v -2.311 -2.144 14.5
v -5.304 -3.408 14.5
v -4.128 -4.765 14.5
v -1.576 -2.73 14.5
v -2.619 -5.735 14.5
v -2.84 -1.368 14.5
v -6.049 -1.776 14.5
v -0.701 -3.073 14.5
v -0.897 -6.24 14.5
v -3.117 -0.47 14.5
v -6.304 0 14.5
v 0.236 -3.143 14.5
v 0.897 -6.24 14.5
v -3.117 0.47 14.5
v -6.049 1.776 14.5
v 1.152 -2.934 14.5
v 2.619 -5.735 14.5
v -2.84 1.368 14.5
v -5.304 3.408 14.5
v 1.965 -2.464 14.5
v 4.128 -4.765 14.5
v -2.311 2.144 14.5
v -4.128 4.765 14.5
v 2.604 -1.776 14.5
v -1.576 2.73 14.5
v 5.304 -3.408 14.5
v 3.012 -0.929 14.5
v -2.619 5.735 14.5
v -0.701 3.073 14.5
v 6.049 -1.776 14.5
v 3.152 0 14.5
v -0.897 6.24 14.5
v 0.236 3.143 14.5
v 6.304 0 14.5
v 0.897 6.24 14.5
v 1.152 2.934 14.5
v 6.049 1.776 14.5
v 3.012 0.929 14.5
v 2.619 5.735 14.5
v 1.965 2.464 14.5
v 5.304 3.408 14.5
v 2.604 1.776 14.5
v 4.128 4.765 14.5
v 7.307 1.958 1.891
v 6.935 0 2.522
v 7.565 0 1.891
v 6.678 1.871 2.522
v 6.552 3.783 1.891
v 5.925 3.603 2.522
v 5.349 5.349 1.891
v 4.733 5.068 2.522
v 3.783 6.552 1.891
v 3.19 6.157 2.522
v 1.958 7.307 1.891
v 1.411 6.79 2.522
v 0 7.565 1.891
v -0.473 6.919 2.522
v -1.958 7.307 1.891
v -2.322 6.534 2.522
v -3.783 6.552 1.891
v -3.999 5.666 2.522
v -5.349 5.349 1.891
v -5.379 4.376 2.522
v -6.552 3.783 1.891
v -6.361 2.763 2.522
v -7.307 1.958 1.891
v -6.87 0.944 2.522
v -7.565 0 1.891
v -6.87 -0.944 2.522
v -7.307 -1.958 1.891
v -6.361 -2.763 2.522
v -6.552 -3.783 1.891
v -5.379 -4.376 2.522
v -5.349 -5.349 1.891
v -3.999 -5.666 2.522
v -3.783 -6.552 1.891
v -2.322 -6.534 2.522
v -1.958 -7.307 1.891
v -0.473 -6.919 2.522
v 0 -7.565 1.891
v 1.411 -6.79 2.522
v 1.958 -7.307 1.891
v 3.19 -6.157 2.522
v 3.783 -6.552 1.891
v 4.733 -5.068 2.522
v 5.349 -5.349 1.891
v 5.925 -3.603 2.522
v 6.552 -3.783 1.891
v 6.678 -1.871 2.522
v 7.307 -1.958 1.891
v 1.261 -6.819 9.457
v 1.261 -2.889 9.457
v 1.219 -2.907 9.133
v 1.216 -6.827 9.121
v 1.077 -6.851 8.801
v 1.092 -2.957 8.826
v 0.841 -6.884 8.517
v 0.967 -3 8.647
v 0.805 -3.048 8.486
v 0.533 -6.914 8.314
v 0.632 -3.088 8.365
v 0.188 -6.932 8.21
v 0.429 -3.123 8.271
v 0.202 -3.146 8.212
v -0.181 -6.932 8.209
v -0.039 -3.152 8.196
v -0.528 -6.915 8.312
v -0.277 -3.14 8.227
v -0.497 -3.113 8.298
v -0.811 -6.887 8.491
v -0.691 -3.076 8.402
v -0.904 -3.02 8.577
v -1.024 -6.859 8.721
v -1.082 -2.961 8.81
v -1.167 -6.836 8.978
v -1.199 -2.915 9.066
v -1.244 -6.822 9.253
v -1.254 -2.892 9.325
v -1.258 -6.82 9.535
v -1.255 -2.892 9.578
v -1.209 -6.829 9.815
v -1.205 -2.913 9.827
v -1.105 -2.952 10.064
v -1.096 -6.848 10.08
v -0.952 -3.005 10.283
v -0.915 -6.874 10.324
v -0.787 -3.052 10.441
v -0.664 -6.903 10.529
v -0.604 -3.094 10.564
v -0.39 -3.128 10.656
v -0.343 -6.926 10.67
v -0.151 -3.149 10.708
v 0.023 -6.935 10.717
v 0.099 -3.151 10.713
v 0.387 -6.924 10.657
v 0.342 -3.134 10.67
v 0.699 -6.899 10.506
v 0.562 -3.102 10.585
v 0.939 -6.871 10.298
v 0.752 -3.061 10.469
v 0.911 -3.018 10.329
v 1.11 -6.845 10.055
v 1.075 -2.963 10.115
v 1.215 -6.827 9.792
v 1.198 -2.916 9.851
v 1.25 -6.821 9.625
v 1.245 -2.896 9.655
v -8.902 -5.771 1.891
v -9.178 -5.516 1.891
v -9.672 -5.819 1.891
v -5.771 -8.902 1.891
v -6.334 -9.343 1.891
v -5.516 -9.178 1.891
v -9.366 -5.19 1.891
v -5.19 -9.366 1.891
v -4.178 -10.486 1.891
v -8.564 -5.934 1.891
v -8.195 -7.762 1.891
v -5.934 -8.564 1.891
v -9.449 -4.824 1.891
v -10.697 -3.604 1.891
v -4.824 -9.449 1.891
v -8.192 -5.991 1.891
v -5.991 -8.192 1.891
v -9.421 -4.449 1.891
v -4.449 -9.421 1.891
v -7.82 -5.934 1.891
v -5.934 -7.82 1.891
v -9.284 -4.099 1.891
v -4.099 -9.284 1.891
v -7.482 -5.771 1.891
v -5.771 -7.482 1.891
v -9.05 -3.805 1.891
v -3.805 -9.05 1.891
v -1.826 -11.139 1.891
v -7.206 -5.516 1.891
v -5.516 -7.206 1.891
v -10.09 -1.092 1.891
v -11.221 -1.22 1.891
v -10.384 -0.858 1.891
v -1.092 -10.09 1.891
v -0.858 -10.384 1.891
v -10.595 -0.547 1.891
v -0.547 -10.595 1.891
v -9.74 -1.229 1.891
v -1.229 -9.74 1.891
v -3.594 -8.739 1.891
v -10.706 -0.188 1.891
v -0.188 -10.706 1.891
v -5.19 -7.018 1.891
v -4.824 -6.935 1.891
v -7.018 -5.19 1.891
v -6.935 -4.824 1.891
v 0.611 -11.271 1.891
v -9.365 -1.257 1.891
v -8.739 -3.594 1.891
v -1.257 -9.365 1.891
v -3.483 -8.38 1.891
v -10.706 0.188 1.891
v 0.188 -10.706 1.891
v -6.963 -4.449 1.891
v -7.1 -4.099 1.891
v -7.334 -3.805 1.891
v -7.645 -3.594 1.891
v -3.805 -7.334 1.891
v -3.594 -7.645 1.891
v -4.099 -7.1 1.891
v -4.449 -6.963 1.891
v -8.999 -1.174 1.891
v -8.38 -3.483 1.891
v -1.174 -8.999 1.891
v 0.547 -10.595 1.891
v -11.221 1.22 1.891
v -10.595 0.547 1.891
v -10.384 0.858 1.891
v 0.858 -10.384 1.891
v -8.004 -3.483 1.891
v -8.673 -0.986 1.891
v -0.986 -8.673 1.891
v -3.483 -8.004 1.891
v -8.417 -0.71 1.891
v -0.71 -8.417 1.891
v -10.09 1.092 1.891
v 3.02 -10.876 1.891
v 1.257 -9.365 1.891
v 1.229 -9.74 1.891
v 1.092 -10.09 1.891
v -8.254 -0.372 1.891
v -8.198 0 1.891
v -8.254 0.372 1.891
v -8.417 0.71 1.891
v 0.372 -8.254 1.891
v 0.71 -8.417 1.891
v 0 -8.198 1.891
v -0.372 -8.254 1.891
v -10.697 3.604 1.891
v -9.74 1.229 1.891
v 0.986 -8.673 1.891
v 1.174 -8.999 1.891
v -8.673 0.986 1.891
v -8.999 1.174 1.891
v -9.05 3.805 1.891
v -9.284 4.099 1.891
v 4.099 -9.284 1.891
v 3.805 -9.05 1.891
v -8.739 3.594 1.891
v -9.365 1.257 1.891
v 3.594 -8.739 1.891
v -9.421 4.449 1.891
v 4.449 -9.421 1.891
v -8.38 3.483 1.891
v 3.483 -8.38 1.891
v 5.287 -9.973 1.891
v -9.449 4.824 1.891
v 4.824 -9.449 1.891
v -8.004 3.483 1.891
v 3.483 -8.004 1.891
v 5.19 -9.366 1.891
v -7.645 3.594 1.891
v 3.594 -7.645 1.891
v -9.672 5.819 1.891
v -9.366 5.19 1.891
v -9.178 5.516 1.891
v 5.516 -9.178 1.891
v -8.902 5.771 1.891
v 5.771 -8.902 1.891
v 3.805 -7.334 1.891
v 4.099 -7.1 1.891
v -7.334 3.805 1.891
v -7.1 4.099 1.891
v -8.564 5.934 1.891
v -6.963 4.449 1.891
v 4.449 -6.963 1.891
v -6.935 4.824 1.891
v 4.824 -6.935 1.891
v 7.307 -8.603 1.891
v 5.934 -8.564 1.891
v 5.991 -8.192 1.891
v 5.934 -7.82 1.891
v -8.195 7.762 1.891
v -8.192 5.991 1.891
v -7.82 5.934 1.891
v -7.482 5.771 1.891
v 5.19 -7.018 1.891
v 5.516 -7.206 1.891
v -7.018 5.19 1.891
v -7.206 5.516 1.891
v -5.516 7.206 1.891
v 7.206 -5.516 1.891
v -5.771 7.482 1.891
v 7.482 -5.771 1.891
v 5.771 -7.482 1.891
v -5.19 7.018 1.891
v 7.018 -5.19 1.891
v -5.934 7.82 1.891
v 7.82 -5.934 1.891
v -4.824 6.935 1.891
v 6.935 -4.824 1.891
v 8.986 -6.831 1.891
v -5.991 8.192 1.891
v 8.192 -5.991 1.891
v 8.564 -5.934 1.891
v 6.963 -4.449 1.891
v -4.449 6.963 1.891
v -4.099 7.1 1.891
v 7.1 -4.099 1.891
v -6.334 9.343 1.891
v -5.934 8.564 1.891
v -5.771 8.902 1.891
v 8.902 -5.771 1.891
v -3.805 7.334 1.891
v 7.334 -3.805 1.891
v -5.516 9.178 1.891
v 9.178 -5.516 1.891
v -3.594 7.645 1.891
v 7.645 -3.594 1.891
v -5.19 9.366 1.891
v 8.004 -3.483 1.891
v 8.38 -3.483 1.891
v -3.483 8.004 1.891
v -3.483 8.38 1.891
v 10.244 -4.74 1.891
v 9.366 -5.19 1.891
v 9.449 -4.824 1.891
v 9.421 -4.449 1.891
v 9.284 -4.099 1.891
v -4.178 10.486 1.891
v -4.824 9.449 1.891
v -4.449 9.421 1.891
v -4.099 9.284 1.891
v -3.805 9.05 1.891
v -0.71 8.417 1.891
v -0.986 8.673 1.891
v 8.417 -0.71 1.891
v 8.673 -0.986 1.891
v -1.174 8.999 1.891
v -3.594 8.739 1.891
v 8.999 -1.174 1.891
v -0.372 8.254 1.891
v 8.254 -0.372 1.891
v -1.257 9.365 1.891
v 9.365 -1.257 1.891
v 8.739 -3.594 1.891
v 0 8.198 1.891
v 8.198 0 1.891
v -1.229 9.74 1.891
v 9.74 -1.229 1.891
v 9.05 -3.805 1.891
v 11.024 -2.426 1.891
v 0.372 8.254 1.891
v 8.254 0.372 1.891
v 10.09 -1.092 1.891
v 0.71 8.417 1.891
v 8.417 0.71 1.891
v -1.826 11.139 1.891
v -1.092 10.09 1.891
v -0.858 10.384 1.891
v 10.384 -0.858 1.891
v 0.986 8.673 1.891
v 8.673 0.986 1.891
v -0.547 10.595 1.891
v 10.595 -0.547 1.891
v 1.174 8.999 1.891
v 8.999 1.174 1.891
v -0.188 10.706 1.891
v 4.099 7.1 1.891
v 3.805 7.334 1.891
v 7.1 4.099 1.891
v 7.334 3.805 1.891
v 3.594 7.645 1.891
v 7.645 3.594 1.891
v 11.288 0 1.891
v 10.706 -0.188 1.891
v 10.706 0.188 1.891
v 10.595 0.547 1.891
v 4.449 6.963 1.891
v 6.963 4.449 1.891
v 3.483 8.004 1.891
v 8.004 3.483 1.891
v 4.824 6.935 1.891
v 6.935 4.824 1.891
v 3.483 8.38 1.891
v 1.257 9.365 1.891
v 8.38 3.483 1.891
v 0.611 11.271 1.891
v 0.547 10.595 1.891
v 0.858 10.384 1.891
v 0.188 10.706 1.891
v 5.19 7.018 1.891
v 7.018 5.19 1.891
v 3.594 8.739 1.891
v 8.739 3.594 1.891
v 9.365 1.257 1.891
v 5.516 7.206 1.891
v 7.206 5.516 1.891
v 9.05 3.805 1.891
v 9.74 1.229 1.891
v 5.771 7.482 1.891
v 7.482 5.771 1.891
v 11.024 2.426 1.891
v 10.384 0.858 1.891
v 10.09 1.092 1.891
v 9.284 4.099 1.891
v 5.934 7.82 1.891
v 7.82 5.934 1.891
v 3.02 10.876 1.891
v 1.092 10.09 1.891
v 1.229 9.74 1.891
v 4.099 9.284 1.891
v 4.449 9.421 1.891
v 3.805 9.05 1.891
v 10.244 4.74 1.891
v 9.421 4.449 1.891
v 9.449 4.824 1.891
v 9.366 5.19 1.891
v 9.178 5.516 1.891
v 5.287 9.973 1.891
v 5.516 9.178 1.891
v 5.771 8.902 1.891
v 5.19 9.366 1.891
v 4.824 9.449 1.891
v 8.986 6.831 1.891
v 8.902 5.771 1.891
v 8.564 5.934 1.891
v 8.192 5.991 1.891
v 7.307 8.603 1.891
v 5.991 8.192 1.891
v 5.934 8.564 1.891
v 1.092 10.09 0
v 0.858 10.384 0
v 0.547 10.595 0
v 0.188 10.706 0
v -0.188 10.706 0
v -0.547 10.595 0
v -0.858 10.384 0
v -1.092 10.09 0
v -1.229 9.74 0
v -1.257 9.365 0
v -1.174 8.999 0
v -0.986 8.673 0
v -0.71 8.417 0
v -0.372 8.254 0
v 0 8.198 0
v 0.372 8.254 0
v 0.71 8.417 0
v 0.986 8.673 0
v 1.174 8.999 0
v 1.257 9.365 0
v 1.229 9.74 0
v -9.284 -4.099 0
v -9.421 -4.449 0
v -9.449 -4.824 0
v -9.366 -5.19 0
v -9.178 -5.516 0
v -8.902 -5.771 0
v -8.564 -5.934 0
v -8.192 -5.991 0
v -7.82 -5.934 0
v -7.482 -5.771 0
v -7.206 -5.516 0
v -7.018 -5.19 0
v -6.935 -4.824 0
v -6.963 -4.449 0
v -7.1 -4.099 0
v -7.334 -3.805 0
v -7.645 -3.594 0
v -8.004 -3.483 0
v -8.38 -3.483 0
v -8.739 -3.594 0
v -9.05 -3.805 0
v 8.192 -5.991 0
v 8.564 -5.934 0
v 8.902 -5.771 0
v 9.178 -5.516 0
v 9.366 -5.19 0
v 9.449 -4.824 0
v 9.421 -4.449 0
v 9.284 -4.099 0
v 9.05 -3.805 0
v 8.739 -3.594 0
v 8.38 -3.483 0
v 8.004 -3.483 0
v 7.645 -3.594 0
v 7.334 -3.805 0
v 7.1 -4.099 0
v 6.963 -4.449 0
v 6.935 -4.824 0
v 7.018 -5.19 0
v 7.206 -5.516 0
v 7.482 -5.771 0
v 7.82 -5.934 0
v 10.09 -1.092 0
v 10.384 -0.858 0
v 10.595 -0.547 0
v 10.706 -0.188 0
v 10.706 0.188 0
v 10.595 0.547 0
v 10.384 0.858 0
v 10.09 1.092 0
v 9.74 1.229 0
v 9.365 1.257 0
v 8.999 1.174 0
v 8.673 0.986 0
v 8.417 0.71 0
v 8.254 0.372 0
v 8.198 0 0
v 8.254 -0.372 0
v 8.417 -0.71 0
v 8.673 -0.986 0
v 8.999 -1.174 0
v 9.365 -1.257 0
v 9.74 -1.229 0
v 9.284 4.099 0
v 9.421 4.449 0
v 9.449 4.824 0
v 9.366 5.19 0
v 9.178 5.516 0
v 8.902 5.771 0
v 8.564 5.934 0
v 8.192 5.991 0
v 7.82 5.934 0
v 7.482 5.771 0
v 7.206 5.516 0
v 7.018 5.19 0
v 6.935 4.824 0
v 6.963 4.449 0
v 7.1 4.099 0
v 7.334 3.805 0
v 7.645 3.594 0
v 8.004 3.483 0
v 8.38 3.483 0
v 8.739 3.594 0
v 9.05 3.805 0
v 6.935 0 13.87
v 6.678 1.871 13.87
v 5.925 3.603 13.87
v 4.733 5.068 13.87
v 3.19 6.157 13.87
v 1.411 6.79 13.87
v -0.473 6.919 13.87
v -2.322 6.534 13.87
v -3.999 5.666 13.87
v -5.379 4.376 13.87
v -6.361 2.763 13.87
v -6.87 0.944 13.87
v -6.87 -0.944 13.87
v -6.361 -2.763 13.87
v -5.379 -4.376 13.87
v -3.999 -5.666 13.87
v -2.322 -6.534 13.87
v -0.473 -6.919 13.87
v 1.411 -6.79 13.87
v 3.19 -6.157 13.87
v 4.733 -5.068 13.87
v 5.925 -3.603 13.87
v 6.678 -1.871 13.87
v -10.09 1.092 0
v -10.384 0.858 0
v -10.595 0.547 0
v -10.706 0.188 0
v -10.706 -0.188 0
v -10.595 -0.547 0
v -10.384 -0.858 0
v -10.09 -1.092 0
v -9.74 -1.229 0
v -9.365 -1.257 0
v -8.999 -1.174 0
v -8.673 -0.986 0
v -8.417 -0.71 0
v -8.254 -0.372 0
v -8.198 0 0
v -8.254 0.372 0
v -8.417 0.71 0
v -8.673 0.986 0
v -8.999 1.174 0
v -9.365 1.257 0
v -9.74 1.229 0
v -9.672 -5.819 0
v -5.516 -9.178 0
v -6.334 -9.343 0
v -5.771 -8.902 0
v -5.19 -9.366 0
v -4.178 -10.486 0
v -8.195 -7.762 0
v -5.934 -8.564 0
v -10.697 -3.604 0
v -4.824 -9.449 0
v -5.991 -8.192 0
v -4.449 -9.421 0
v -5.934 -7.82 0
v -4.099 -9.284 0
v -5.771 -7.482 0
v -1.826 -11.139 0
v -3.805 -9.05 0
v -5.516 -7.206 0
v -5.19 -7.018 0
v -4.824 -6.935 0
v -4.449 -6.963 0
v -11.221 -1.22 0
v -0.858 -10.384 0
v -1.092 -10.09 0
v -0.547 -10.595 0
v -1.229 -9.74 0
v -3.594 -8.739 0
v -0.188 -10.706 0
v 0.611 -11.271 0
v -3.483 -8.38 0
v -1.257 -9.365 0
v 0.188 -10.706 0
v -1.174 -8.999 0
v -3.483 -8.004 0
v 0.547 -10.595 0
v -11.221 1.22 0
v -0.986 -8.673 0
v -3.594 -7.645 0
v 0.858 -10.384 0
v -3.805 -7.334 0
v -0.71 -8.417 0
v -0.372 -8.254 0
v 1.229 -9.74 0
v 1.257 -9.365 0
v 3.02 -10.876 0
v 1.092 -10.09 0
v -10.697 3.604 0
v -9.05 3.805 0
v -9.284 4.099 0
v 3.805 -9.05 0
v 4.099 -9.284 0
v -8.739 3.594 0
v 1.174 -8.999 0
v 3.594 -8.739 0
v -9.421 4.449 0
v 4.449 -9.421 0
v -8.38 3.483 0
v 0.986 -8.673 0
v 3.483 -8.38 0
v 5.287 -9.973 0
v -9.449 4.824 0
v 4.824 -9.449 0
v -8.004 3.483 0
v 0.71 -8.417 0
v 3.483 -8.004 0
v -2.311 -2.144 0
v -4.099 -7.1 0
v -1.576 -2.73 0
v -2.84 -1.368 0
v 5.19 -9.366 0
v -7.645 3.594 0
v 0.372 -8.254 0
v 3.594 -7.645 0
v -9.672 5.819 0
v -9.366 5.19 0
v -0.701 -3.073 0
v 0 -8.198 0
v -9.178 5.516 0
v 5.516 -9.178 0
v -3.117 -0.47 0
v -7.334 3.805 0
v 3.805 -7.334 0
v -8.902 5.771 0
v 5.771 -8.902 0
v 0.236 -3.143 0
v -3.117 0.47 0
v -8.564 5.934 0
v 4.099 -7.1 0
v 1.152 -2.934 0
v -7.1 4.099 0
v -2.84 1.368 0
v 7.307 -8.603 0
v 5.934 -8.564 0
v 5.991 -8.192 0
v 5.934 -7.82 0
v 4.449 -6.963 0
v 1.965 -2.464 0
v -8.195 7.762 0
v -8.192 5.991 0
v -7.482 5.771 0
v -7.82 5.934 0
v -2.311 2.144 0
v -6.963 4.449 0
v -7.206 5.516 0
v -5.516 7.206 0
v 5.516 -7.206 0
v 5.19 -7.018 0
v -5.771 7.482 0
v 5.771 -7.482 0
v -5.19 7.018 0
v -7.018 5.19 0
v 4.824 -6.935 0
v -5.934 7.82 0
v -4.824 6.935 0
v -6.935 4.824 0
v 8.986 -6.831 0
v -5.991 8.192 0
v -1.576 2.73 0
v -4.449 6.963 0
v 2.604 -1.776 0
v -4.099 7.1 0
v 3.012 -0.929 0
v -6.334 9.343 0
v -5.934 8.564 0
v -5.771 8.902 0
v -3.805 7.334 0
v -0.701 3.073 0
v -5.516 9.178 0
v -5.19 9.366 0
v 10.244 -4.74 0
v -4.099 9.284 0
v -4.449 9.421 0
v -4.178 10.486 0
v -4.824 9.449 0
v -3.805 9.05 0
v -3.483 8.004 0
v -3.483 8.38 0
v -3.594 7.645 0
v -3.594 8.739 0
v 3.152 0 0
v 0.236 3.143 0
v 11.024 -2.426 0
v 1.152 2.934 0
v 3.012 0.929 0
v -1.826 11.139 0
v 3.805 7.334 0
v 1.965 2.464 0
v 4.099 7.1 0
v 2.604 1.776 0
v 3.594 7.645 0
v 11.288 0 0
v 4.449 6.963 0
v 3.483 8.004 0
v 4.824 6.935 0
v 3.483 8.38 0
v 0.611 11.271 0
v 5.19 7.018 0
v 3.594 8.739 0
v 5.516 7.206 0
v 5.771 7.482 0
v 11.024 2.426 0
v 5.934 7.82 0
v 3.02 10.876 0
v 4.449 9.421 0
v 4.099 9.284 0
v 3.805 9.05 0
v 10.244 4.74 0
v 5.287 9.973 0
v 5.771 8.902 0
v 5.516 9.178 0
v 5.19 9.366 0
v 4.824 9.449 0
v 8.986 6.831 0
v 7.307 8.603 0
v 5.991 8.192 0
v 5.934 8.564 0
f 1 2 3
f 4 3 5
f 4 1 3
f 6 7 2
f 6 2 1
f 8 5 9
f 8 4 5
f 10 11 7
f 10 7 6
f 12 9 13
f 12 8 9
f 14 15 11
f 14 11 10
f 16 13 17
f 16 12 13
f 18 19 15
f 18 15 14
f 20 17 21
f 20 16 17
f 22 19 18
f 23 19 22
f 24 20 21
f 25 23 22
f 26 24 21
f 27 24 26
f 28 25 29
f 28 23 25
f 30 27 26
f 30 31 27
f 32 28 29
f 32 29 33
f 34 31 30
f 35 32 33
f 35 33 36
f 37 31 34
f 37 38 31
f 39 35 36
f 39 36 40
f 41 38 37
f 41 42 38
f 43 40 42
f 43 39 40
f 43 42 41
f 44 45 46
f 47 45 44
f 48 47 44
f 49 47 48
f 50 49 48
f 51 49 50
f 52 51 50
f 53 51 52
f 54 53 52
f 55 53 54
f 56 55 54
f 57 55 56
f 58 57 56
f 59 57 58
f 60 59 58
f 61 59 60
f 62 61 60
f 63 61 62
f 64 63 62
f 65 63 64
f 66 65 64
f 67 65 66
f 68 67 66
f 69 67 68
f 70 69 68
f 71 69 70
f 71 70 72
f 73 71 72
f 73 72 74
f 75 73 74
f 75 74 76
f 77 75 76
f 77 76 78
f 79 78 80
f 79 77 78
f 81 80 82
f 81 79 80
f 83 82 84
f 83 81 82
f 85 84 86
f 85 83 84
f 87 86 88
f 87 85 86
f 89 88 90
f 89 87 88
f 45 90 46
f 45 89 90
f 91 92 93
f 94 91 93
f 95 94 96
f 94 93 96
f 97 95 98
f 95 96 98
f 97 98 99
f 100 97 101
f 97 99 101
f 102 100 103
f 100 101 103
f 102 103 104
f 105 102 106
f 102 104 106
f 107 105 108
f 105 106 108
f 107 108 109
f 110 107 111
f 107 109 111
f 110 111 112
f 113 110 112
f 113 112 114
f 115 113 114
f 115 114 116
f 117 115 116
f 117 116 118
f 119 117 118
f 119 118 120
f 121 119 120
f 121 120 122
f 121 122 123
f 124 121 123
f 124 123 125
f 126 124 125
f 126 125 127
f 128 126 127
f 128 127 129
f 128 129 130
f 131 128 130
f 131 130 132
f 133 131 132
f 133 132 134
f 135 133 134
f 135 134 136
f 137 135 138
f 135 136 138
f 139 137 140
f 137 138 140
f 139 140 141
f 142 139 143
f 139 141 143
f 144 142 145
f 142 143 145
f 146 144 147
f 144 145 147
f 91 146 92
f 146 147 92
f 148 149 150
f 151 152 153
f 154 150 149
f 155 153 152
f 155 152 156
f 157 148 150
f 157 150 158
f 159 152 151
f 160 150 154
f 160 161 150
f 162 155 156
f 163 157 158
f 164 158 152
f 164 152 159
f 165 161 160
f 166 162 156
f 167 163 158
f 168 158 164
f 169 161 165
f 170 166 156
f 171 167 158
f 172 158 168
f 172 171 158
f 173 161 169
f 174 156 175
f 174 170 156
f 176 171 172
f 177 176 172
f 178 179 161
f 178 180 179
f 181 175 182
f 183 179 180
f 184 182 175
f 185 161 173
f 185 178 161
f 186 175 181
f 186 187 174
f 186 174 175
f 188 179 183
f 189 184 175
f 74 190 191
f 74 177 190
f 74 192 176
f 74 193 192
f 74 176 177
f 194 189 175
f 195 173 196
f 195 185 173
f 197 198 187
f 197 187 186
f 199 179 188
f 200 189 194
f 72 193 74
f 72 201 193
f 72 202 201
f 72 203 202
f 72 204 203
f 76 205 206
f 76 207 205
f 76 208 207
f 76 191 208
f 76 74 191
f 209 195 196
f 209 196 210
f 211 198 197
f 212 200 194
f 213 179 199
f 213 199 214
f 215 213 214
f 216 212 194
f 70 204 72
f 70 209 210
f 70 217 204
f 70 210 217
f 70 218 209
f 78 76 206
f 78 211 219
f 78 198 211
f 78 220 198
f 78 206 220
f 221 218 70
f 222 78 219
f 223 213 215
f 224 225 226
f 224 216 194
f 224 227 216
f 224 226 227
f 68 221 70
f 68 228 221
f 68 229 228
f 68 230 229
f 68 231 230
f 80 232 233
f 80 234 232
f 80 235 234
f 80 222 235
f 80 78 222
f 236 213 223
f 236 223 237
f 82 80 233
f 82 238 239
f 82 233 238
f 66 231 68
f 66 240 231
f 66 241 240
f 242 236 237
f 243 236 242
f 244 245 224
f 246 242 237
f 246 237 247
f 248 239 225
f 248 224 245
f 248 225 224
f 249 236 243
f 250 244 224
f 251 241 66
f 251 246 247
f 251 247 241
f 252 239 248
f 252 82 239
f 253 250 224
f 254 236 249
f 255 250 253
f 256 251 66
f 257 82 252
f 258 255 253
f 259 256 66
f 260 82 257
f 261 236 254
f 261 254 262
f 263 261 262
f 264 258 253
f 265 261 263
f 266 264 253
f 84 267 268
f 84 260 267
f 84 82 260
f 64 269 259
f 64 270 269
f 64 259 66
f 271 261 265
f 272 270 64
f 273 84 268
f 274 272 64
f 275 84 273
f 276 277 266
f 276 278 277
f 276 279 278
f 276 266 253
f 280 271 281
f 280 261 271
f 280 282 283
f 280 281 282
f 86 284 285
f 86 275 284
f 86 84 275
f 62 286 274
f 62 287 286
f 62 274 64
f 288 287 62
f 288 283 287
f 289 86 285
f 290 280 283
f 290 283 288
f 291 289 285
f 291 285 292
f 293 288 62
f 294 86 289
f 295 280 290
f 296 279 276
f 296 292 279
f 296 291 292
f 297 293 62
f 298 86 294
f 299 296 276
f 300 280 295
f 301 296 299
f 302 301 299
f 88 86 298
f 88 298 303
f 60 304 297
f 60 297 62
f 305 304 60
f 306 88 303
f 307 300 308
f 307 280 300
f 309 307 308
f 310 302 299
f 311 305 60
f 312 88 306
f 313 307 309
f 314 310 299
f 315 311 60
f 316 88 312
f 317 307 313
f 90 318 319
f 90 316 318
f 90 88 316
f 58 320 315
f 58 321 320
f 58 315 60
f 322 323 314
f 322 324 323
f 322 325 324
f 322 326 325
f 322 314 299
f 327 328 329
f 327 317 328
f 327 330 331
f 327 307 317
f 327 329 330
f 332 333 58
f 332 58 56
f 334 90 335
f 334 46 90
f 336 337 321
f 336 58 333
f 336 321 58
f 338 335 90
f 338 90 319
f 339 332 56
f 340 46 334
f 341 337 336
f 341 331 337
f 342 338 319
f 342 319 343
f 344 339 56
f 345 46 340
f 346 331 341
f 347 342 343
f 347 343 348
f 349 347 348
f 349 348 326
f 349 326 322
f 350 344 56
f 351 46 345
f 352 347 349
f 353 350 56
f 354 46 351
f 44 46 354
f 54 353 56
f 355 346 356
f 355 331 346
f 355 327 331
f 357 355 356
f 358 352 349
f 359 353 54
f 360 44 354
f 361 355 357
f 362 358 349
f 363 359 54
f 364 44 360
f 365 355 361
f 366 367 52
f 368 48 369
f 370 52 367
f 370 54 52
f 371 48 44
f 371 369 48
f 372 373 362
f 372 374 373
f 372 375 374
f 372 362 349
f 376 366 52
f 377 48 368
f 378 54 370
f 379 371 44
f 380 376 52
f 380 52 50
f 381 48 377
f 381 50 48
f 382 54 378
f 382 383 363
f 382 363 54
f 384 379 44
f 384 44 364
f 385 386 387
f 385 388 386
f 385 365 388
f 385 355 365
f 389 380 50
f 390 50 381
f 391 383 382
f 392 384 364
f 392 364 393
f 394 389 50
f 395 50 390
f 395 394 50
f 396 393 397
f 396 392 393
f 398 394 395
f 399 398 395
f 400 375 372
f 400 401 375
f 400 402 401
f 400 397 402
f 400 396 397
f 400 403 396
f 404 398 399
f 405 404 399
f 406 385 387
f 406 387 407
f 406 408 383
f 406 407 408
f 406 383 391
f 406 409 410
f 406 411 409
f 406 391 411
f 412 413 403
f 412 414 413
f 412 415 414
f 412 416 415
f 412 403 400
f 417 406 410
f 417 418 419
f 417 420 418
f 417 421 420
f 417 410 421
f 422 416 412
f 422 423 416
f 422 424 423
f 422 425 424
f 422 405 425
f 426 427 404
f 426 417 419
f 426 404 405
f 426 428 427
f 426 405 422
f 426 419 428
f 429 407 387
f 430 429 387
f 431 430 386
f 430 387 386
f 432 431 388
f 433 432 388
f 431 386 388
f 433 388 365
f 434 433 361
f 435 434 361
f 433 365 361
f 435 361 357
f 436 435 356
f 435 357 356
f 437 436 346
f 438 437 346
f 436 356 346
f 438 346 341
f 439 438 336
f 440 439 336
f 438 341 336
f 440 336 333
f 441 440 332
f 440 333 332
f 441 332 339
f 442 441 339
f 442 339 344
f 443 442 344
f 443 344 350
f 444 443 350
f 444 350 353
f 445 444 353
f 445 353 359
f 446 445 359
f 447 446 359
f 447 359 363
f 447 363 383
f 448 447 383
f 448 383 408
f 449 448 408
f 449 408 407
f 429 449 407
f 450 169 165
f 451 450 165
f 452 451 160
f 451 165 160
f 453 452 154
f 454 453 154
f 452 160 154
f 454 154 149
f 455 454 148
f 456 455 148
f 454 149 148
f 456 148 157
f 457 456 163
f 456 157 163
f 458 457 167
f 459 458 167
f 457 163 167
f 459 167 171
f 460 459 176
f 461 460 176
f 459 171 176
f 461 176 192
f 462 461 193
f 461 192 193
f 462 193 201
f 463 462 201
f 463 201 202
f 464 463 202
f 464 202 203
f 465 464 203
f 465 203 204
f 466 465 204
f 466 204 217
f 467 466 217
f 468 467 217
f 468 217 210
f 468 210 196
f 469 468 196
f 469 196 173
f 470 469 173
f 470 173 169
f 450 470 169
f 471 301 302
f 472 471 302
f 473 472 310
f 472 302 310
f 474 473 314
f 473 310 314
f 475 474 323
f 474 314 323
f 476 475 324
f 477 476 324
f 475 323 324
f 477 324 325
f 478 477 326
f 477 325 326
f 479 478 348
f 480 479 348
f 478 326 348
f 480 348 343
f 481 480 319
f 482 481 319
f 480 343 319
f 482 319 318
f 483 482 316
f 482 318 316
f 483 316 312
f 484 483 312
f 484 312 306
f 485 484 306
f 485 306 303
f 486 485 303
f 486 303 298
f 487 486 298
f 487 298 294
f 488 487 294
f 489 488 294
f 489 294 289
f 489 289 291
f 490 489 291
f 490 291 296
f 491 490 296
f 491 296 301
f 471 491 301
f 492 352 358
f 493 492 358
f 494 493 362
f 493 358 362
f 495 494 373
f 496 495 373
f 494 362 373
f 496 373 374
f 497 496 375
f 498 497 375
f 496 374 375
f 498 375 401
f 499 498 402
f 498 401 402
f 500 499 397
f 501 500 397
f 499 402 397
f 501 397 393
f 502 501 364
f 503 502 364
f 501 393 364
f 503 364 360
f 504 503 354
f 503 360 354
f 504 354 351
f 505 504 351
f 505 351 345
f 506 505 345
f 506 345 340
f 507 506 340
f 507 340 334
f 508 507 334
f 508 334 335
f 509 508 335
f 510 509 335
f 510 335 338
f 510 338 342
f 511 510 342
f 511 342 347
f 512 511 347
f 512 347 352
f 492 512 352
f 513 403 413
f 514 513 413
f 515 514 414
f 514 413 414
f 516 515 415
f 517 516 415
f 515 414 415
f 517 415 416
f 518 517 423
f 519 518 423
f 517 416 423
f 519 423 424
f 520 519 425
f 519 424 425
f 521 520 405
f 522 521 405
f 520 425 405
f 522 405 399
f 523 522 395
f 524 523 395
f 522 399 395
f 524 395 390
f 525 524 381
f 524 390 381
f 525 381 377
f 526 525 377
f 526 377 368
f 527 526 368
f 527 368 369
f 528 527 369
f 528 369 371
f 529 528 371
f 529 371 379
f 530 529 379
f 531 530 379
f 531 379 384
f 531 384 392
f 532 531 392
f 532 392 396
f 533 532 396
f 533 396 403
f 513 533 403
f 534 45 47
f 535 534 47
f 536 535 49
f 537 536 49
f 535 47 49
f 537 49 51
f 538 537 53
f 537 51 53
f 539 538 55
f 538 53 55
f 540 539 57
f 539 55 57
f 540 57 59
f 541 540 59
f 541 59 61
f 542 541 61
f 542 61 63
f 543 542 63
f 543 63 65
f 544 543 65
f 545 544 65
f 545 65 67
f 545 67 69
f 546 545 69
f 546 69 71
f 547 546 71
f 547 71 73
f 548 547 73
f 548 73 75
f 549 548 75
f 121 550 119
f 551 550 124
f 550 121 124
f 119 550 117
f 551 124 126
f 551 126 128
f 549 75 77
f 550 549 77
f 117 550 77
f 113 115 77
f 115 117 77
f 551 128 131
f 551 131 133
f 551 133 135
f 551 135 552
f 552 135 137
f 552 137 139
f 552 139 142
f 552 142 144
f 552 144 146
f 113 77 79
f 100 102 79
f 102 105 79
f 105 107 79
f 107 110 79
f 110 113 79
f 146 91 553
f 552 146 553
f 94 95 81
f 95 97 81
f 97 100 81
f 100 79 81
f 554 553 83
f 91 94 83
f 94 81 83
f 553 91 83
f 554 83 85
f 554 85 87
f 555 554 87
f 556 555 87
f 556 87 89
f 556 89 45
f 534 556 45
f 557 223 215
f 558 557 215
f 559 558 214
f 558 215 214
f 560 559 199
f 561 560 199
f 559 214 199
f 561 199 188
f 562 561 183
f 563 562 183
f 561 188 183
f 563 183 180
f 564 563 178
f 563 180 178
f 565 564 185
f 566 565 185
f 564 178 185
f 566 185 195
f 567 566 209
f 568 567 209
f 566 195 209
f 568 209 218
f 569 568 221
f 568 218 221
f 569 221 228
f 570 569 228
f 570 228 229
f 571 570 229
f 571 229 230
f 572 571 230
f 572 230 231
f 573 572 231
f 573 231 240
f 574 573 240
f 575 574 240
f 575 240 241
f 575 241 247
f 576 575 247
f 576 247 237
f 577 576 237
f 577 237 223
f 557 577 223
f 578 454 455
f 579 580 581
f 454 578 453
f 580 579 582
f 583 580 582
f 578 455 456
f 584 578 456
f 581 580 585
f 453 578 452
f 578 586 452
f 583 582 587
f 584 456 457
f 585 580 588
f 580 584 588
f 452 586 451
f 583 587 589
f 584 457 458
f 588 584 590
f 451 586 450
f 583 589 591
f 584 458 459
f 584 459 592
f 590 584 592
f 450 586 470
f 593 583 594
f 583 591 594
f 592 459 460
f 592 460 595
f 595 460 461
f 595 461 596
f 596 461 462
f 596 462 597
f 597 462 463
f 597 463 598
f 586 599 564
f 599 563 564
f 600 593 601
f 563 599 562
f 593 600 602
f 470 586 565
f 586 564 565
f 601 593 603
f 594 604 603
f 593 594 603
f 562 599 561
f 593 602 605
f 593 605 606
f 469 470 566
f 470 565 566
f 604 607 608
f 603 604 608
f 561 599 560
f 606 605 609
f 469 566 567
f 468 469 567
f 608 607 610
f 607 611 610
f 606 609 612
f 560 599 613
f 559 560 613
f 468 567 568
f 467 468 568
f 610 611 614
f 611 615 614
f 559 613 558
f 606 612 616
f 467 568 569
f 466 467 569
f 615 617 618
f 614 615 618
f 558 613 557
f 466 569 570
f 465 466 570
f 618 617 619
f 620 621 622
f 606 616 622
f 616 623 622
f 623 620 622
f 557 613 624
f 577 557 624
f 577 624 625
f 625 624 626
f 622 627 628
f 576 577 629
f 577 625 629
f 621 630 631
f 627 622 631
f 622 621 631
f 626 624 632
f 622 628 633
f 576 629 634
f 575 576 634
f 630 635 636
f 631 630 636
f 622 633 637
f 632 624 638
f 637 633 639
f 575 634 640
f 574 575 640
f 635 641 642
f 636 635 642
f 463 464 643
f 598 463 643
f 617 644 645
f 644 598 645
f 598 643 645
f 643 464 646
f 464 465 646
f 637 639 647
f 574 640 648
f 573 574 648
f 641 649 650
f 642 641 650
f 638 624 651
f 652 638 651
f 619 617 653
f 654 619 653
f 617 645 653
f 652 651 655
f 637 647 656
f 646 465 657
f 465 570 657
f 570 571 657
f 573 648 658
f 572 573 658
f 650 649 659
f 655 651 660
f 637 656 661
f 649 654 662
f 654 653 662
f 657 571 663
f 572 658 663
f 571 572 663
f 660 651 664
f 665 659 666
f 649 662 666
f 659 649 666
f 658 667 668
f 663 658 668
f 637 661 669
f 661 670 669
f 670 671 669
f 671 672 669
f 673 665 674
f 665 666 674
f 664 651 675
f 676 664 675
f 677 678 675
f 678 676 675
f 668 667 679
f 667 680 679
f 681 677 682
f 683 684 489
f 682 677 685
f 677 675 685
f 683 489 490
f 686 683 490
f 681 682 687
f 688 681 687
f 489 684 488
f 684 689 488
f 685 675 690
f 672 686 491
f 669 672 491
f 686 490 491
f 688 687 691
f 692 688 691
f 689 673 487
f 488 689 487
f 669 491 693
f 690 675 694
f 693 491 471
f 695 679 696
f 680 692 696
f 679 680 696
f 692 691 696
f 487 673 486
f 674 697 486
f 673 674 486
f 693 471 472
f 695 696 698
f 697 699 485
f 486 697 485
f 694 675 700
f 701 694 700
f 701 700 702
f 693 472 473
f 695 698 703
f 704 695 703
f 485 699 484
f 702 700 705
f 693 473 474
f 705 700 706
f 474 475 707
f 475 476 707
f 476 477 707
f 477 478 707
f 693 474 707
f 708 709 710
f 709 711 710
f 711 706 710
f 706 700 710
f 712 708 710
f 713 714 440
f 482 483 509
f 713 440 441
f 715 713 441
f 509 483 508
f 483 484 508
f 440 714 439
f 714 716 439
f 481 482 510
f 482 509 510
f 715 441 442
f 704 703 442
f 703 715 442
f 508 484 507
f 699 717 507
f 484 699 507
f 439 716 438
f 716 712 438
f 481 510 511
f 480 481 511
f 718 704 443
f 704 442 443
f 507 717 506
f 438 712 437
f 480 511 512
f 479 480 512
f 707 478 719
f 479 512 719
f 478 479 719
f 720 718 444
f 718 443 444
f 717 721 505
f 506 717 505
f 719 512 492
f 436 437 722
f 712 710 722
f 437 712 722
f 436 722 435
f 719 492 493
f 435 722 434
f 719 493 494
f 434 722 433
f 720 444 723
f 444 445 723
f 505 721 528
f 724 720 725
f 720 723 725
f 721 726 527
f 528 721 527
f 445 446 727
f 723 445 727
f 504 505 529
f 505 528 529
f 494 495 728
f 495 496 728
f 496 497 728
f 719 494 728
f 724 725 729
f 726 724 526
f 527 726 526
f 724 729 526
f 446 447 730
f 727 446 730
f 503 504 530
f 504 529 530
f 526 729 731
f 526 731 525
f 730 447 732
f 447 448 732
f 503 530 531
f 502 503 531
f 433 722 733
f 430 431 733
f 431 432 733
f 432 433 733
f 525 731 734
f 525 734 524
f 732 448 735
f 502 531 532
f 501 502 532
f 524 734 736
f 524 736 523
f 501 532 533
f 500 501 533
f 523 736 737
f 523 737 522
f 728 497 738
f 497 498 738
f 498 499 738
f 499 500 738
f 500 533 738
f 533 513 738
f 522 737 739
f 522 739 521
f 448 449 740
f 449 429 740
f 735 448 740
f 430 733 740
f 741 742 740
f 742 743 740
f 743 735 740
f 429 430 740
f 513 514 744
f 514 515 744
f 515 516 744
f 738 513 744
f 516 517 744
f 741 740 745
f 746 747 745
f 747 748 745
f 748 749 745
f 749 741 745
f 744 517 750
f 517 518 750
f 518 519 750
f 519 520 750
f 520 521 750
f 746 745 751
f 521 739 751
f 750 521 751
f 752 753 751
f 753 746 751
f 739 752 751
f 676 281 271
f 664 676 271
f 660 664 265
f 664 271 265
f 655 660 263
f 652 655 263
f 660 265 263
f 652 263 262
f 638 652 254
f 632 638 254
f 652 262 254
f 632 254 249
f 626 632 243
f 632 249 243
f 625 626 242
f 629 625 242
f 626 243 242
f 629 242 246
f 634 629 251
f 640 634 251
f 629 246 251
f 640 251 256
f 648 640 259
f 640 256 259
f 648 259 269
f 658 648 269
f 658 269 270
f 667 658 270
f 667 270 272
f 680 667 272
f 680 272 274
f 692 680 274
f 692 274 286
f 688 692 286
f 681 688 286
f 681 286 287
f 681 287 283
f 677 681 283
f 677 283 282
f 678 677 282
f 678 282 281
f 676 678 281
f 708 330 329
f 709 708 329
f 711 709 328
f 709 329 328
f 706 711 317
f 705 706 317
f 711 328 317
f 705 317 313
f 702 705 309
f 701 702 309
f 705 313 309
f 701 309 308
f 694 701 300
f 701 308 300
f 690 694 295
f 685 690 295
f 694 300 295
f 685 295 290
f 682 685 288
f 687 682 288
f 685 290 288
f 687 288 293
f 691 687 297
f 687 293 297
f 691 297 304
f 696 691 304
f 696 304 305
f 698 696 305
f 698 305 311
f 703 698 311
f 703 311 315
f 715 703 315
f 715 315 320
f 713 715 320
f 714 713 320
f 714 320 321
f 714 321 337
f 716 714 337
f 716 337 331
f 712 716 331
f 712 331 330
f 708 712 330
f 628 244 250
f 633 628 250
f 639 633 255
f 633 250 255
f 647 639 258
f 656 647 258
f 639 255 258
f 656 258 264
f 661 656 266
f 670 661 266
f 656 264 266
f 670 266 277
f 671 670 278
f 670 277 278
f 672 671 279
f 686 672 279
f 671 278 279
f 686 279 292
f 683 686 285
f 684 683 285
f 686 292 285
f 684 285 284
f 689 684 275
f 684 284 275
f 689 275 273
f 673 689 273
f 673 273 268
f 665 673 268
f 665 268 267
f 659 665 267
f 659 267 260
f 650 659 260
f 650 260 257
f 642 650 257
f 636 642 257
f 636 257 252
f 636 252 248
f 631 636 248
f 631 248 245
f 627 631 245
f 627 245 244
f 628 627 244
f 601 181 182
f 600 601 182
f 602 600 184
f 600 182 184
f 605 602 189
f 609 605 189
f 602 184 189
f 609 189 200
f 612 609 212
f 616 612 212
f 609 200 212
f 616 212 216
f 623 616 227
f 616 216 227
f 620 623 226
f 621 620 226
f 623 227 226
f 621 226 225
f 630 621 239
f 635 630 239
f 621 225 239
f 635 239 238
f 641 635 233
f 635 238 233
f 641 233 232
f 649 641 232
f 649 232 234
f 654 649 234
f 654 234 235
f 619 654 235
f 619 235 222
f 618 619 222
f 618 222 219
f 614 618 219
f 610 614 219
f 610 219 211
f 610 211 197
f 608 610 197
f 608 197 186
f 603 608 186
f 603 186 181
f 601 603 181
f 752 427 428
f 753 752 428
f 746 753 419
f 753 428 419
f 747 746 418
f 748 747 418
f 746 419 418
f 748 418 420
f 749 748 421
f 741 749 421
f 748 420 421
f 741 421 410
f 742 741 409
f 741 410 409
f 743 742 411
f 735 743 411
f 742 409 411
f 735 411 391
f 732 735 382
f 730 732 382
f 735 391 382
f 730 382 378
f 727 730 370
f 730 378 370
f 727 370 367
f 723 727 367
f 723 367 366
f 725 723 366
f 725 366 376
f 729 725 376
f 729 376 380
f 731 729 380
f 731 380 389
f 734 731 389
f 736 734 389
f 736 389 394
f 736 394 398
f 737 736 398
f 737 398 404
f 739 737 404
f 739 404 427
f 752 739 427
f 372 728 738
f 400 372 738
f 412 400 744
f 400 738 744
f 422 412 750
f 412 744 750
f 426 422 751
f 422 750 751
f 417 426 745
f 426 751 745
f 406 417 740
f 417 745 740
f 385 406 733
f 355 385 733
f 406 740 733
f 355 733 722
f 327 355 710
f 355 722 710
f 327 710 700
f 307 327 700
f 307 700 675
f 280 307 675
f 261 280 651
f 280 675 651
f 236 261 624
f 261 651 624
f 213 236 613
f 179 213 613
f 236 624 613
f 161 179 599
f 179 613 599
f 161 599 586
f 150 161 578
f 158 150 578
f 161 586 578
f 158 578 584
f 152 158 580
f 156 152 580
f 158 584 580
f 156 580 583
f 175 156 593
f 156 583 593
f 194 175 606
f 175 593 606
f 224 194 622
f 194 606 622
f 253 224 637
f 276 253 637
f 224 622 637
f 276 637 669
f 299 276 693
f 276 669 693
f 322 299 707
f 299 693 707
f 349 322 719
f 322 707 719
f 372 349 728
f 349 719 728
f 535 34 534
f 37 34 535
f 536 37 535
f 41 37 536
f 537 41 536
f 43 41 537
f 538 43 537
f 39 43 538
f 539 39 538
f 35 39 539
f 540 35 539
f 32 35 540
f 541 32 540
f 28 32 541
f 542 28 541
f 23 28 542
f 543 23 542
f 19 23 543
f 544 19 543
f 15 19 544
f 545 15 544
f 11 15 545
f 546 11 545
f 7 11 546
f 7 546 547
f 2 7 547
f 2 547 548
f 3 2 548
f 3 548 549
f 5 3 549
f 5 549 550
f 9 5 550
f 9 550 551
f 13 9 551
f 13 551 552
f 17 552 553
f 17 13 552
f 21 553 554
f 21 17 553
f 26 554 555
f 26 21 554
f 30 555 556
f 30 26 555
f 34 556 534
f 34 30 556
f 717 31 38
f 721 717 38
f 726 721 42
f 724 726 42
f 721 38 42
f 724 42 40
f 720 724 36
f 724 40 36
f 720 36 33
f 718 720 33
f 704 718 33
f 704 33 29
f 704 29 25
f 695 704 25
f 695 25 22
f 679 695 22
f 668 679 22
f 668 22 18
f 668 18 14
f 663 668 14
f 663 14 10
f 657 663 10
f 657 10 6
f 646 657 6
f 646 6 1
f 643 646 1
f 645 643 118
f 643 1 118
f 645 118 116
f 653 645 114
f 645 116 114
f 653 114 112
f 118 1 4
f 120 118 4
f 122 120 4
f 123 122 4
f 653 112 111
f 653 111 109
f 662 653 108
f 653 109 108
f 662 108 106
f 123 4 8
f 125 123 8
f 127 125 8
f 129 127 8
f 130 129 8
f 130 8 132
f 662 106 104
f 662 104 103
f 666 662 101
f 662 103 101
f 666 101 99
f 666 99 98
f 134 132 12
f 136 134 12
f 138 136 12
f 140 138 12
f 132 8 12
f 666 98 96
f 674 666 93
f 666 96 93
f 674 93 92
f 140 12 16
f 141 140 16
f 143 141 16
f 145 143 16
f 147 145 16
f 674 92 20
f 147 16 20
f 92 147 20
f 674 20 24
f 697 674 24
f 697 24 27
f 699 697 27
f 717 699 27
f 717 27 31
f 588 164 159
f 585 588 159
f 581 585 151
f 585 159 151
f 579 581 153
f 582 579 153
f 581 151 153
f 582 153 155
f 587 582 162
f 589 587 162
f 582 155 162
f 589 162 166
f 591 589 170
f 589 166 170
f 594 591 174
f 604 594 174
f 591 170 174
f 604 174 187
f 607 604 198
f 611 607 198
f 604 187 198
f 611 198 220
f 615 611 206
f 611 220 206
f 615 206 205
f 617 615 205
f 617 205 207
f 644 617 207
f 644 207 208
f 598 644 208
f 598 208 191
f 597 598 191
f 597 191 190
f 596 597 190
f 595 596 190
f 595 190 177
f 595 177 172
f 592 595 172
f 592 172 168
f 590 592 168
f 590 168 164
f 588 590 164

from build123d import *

# Parameters (mm, degrees)
SKETCH1_R           = 17.904347826
BOSS_EXTRUDE1_DEPTH = 3
SKETCH2_R           = 11
BOSS_EXTRUDE2_DEPTH = 20
SKETCH3_R           = 5
CUT_EXTRUDE1_DEPTH  = 24
SKETCH4_R           = 2
CUT_EXTRUDE2_DEPTH  = 15
CHAMFER1_SIZE       = 1
SKETCH5_R           = 2
CUT_EXTRUDE5_DEPTH  = 4.0000001
CIRPATTERN2_COUNT   = 12
SCALE1_SCALE        = 0.630434783


with BuildPart() as part:
    # Sketch1 → Boss-Extrude1 (new body)
    with BuildSketch(Plane.XY):
        Circle(SKETCH1_R)
    extrude(amount=BOSS_EXTRUDE1_DEPTH)

    # Sketch2 → Boss-Extrude2 (add)
    with BuildSketch(Plane.XY.offset(3)):
        Circle(SKETCH2_R)
    extrude(amount=BOSS_EXTRUDE2_DEPTH)

    # Sketch3 → Cut-Extrude1 (cut, through all)
    with BuildSketch(Plane.XY.offset(23)):
        Circle(SKETCH3_R)
    extrude(amount=-CUT_EXTRUDE1_DEPTH, mode=Mode.SUBTRACT)

    # Sketch4 → Cut-Extrude2 (cut)
    with BuildSketch(Plane(origin=(0, 0, 0), x_dir=(1, 0, 0), z_dir=(0, 1, 0))):
        with Locations((0, -15)):
            Circle(SKETCH4_R)
    extrude(amount=-CUT_EXTRUDE2_DEPTH, mode=Mode.SUBTRACT)

    # Chamfer1
    chamfer1_edges = [part.edges().sort_by_distance(p)[0] for p in [
        (-11, 0, 3),
        (-11, 0, 23),
    ]]
    chamfer(chamfer1_edges, length=CHAMFER1_SIZE)

    # Sketch5 → Cut-Extrude5 (cut, through all)
    with BuildSketch(Plane.XY.offset(3)):
        with Locations((7.502173913, 12.994146385)):
            Circle(SKETCH5_R)
    cut_extrude5 = extrude(amount=-CUT_EXTRUDE5_DEPTH, mode=Mode.SUBTRACT)

    # CirPattern2: Cut-Extrude5 ×12 about axis
    cirpattern2_axis = Axis((0, 0, 0), (0, 0, 1))
    for i in range(1, CIRPATTERN2_COUNT):
        add(cut_extrude5.rotate(cirpattern2_axis, i * 360 / CIRPATTERN2_COUNT), mode=Mode.SUBTRACT)


with BuildPart() as part_1:
    # Scale1: scaled about (0, 0, 0)
    add(part.part.scale(SCALE1_SCALE))


solid = part_1.part
